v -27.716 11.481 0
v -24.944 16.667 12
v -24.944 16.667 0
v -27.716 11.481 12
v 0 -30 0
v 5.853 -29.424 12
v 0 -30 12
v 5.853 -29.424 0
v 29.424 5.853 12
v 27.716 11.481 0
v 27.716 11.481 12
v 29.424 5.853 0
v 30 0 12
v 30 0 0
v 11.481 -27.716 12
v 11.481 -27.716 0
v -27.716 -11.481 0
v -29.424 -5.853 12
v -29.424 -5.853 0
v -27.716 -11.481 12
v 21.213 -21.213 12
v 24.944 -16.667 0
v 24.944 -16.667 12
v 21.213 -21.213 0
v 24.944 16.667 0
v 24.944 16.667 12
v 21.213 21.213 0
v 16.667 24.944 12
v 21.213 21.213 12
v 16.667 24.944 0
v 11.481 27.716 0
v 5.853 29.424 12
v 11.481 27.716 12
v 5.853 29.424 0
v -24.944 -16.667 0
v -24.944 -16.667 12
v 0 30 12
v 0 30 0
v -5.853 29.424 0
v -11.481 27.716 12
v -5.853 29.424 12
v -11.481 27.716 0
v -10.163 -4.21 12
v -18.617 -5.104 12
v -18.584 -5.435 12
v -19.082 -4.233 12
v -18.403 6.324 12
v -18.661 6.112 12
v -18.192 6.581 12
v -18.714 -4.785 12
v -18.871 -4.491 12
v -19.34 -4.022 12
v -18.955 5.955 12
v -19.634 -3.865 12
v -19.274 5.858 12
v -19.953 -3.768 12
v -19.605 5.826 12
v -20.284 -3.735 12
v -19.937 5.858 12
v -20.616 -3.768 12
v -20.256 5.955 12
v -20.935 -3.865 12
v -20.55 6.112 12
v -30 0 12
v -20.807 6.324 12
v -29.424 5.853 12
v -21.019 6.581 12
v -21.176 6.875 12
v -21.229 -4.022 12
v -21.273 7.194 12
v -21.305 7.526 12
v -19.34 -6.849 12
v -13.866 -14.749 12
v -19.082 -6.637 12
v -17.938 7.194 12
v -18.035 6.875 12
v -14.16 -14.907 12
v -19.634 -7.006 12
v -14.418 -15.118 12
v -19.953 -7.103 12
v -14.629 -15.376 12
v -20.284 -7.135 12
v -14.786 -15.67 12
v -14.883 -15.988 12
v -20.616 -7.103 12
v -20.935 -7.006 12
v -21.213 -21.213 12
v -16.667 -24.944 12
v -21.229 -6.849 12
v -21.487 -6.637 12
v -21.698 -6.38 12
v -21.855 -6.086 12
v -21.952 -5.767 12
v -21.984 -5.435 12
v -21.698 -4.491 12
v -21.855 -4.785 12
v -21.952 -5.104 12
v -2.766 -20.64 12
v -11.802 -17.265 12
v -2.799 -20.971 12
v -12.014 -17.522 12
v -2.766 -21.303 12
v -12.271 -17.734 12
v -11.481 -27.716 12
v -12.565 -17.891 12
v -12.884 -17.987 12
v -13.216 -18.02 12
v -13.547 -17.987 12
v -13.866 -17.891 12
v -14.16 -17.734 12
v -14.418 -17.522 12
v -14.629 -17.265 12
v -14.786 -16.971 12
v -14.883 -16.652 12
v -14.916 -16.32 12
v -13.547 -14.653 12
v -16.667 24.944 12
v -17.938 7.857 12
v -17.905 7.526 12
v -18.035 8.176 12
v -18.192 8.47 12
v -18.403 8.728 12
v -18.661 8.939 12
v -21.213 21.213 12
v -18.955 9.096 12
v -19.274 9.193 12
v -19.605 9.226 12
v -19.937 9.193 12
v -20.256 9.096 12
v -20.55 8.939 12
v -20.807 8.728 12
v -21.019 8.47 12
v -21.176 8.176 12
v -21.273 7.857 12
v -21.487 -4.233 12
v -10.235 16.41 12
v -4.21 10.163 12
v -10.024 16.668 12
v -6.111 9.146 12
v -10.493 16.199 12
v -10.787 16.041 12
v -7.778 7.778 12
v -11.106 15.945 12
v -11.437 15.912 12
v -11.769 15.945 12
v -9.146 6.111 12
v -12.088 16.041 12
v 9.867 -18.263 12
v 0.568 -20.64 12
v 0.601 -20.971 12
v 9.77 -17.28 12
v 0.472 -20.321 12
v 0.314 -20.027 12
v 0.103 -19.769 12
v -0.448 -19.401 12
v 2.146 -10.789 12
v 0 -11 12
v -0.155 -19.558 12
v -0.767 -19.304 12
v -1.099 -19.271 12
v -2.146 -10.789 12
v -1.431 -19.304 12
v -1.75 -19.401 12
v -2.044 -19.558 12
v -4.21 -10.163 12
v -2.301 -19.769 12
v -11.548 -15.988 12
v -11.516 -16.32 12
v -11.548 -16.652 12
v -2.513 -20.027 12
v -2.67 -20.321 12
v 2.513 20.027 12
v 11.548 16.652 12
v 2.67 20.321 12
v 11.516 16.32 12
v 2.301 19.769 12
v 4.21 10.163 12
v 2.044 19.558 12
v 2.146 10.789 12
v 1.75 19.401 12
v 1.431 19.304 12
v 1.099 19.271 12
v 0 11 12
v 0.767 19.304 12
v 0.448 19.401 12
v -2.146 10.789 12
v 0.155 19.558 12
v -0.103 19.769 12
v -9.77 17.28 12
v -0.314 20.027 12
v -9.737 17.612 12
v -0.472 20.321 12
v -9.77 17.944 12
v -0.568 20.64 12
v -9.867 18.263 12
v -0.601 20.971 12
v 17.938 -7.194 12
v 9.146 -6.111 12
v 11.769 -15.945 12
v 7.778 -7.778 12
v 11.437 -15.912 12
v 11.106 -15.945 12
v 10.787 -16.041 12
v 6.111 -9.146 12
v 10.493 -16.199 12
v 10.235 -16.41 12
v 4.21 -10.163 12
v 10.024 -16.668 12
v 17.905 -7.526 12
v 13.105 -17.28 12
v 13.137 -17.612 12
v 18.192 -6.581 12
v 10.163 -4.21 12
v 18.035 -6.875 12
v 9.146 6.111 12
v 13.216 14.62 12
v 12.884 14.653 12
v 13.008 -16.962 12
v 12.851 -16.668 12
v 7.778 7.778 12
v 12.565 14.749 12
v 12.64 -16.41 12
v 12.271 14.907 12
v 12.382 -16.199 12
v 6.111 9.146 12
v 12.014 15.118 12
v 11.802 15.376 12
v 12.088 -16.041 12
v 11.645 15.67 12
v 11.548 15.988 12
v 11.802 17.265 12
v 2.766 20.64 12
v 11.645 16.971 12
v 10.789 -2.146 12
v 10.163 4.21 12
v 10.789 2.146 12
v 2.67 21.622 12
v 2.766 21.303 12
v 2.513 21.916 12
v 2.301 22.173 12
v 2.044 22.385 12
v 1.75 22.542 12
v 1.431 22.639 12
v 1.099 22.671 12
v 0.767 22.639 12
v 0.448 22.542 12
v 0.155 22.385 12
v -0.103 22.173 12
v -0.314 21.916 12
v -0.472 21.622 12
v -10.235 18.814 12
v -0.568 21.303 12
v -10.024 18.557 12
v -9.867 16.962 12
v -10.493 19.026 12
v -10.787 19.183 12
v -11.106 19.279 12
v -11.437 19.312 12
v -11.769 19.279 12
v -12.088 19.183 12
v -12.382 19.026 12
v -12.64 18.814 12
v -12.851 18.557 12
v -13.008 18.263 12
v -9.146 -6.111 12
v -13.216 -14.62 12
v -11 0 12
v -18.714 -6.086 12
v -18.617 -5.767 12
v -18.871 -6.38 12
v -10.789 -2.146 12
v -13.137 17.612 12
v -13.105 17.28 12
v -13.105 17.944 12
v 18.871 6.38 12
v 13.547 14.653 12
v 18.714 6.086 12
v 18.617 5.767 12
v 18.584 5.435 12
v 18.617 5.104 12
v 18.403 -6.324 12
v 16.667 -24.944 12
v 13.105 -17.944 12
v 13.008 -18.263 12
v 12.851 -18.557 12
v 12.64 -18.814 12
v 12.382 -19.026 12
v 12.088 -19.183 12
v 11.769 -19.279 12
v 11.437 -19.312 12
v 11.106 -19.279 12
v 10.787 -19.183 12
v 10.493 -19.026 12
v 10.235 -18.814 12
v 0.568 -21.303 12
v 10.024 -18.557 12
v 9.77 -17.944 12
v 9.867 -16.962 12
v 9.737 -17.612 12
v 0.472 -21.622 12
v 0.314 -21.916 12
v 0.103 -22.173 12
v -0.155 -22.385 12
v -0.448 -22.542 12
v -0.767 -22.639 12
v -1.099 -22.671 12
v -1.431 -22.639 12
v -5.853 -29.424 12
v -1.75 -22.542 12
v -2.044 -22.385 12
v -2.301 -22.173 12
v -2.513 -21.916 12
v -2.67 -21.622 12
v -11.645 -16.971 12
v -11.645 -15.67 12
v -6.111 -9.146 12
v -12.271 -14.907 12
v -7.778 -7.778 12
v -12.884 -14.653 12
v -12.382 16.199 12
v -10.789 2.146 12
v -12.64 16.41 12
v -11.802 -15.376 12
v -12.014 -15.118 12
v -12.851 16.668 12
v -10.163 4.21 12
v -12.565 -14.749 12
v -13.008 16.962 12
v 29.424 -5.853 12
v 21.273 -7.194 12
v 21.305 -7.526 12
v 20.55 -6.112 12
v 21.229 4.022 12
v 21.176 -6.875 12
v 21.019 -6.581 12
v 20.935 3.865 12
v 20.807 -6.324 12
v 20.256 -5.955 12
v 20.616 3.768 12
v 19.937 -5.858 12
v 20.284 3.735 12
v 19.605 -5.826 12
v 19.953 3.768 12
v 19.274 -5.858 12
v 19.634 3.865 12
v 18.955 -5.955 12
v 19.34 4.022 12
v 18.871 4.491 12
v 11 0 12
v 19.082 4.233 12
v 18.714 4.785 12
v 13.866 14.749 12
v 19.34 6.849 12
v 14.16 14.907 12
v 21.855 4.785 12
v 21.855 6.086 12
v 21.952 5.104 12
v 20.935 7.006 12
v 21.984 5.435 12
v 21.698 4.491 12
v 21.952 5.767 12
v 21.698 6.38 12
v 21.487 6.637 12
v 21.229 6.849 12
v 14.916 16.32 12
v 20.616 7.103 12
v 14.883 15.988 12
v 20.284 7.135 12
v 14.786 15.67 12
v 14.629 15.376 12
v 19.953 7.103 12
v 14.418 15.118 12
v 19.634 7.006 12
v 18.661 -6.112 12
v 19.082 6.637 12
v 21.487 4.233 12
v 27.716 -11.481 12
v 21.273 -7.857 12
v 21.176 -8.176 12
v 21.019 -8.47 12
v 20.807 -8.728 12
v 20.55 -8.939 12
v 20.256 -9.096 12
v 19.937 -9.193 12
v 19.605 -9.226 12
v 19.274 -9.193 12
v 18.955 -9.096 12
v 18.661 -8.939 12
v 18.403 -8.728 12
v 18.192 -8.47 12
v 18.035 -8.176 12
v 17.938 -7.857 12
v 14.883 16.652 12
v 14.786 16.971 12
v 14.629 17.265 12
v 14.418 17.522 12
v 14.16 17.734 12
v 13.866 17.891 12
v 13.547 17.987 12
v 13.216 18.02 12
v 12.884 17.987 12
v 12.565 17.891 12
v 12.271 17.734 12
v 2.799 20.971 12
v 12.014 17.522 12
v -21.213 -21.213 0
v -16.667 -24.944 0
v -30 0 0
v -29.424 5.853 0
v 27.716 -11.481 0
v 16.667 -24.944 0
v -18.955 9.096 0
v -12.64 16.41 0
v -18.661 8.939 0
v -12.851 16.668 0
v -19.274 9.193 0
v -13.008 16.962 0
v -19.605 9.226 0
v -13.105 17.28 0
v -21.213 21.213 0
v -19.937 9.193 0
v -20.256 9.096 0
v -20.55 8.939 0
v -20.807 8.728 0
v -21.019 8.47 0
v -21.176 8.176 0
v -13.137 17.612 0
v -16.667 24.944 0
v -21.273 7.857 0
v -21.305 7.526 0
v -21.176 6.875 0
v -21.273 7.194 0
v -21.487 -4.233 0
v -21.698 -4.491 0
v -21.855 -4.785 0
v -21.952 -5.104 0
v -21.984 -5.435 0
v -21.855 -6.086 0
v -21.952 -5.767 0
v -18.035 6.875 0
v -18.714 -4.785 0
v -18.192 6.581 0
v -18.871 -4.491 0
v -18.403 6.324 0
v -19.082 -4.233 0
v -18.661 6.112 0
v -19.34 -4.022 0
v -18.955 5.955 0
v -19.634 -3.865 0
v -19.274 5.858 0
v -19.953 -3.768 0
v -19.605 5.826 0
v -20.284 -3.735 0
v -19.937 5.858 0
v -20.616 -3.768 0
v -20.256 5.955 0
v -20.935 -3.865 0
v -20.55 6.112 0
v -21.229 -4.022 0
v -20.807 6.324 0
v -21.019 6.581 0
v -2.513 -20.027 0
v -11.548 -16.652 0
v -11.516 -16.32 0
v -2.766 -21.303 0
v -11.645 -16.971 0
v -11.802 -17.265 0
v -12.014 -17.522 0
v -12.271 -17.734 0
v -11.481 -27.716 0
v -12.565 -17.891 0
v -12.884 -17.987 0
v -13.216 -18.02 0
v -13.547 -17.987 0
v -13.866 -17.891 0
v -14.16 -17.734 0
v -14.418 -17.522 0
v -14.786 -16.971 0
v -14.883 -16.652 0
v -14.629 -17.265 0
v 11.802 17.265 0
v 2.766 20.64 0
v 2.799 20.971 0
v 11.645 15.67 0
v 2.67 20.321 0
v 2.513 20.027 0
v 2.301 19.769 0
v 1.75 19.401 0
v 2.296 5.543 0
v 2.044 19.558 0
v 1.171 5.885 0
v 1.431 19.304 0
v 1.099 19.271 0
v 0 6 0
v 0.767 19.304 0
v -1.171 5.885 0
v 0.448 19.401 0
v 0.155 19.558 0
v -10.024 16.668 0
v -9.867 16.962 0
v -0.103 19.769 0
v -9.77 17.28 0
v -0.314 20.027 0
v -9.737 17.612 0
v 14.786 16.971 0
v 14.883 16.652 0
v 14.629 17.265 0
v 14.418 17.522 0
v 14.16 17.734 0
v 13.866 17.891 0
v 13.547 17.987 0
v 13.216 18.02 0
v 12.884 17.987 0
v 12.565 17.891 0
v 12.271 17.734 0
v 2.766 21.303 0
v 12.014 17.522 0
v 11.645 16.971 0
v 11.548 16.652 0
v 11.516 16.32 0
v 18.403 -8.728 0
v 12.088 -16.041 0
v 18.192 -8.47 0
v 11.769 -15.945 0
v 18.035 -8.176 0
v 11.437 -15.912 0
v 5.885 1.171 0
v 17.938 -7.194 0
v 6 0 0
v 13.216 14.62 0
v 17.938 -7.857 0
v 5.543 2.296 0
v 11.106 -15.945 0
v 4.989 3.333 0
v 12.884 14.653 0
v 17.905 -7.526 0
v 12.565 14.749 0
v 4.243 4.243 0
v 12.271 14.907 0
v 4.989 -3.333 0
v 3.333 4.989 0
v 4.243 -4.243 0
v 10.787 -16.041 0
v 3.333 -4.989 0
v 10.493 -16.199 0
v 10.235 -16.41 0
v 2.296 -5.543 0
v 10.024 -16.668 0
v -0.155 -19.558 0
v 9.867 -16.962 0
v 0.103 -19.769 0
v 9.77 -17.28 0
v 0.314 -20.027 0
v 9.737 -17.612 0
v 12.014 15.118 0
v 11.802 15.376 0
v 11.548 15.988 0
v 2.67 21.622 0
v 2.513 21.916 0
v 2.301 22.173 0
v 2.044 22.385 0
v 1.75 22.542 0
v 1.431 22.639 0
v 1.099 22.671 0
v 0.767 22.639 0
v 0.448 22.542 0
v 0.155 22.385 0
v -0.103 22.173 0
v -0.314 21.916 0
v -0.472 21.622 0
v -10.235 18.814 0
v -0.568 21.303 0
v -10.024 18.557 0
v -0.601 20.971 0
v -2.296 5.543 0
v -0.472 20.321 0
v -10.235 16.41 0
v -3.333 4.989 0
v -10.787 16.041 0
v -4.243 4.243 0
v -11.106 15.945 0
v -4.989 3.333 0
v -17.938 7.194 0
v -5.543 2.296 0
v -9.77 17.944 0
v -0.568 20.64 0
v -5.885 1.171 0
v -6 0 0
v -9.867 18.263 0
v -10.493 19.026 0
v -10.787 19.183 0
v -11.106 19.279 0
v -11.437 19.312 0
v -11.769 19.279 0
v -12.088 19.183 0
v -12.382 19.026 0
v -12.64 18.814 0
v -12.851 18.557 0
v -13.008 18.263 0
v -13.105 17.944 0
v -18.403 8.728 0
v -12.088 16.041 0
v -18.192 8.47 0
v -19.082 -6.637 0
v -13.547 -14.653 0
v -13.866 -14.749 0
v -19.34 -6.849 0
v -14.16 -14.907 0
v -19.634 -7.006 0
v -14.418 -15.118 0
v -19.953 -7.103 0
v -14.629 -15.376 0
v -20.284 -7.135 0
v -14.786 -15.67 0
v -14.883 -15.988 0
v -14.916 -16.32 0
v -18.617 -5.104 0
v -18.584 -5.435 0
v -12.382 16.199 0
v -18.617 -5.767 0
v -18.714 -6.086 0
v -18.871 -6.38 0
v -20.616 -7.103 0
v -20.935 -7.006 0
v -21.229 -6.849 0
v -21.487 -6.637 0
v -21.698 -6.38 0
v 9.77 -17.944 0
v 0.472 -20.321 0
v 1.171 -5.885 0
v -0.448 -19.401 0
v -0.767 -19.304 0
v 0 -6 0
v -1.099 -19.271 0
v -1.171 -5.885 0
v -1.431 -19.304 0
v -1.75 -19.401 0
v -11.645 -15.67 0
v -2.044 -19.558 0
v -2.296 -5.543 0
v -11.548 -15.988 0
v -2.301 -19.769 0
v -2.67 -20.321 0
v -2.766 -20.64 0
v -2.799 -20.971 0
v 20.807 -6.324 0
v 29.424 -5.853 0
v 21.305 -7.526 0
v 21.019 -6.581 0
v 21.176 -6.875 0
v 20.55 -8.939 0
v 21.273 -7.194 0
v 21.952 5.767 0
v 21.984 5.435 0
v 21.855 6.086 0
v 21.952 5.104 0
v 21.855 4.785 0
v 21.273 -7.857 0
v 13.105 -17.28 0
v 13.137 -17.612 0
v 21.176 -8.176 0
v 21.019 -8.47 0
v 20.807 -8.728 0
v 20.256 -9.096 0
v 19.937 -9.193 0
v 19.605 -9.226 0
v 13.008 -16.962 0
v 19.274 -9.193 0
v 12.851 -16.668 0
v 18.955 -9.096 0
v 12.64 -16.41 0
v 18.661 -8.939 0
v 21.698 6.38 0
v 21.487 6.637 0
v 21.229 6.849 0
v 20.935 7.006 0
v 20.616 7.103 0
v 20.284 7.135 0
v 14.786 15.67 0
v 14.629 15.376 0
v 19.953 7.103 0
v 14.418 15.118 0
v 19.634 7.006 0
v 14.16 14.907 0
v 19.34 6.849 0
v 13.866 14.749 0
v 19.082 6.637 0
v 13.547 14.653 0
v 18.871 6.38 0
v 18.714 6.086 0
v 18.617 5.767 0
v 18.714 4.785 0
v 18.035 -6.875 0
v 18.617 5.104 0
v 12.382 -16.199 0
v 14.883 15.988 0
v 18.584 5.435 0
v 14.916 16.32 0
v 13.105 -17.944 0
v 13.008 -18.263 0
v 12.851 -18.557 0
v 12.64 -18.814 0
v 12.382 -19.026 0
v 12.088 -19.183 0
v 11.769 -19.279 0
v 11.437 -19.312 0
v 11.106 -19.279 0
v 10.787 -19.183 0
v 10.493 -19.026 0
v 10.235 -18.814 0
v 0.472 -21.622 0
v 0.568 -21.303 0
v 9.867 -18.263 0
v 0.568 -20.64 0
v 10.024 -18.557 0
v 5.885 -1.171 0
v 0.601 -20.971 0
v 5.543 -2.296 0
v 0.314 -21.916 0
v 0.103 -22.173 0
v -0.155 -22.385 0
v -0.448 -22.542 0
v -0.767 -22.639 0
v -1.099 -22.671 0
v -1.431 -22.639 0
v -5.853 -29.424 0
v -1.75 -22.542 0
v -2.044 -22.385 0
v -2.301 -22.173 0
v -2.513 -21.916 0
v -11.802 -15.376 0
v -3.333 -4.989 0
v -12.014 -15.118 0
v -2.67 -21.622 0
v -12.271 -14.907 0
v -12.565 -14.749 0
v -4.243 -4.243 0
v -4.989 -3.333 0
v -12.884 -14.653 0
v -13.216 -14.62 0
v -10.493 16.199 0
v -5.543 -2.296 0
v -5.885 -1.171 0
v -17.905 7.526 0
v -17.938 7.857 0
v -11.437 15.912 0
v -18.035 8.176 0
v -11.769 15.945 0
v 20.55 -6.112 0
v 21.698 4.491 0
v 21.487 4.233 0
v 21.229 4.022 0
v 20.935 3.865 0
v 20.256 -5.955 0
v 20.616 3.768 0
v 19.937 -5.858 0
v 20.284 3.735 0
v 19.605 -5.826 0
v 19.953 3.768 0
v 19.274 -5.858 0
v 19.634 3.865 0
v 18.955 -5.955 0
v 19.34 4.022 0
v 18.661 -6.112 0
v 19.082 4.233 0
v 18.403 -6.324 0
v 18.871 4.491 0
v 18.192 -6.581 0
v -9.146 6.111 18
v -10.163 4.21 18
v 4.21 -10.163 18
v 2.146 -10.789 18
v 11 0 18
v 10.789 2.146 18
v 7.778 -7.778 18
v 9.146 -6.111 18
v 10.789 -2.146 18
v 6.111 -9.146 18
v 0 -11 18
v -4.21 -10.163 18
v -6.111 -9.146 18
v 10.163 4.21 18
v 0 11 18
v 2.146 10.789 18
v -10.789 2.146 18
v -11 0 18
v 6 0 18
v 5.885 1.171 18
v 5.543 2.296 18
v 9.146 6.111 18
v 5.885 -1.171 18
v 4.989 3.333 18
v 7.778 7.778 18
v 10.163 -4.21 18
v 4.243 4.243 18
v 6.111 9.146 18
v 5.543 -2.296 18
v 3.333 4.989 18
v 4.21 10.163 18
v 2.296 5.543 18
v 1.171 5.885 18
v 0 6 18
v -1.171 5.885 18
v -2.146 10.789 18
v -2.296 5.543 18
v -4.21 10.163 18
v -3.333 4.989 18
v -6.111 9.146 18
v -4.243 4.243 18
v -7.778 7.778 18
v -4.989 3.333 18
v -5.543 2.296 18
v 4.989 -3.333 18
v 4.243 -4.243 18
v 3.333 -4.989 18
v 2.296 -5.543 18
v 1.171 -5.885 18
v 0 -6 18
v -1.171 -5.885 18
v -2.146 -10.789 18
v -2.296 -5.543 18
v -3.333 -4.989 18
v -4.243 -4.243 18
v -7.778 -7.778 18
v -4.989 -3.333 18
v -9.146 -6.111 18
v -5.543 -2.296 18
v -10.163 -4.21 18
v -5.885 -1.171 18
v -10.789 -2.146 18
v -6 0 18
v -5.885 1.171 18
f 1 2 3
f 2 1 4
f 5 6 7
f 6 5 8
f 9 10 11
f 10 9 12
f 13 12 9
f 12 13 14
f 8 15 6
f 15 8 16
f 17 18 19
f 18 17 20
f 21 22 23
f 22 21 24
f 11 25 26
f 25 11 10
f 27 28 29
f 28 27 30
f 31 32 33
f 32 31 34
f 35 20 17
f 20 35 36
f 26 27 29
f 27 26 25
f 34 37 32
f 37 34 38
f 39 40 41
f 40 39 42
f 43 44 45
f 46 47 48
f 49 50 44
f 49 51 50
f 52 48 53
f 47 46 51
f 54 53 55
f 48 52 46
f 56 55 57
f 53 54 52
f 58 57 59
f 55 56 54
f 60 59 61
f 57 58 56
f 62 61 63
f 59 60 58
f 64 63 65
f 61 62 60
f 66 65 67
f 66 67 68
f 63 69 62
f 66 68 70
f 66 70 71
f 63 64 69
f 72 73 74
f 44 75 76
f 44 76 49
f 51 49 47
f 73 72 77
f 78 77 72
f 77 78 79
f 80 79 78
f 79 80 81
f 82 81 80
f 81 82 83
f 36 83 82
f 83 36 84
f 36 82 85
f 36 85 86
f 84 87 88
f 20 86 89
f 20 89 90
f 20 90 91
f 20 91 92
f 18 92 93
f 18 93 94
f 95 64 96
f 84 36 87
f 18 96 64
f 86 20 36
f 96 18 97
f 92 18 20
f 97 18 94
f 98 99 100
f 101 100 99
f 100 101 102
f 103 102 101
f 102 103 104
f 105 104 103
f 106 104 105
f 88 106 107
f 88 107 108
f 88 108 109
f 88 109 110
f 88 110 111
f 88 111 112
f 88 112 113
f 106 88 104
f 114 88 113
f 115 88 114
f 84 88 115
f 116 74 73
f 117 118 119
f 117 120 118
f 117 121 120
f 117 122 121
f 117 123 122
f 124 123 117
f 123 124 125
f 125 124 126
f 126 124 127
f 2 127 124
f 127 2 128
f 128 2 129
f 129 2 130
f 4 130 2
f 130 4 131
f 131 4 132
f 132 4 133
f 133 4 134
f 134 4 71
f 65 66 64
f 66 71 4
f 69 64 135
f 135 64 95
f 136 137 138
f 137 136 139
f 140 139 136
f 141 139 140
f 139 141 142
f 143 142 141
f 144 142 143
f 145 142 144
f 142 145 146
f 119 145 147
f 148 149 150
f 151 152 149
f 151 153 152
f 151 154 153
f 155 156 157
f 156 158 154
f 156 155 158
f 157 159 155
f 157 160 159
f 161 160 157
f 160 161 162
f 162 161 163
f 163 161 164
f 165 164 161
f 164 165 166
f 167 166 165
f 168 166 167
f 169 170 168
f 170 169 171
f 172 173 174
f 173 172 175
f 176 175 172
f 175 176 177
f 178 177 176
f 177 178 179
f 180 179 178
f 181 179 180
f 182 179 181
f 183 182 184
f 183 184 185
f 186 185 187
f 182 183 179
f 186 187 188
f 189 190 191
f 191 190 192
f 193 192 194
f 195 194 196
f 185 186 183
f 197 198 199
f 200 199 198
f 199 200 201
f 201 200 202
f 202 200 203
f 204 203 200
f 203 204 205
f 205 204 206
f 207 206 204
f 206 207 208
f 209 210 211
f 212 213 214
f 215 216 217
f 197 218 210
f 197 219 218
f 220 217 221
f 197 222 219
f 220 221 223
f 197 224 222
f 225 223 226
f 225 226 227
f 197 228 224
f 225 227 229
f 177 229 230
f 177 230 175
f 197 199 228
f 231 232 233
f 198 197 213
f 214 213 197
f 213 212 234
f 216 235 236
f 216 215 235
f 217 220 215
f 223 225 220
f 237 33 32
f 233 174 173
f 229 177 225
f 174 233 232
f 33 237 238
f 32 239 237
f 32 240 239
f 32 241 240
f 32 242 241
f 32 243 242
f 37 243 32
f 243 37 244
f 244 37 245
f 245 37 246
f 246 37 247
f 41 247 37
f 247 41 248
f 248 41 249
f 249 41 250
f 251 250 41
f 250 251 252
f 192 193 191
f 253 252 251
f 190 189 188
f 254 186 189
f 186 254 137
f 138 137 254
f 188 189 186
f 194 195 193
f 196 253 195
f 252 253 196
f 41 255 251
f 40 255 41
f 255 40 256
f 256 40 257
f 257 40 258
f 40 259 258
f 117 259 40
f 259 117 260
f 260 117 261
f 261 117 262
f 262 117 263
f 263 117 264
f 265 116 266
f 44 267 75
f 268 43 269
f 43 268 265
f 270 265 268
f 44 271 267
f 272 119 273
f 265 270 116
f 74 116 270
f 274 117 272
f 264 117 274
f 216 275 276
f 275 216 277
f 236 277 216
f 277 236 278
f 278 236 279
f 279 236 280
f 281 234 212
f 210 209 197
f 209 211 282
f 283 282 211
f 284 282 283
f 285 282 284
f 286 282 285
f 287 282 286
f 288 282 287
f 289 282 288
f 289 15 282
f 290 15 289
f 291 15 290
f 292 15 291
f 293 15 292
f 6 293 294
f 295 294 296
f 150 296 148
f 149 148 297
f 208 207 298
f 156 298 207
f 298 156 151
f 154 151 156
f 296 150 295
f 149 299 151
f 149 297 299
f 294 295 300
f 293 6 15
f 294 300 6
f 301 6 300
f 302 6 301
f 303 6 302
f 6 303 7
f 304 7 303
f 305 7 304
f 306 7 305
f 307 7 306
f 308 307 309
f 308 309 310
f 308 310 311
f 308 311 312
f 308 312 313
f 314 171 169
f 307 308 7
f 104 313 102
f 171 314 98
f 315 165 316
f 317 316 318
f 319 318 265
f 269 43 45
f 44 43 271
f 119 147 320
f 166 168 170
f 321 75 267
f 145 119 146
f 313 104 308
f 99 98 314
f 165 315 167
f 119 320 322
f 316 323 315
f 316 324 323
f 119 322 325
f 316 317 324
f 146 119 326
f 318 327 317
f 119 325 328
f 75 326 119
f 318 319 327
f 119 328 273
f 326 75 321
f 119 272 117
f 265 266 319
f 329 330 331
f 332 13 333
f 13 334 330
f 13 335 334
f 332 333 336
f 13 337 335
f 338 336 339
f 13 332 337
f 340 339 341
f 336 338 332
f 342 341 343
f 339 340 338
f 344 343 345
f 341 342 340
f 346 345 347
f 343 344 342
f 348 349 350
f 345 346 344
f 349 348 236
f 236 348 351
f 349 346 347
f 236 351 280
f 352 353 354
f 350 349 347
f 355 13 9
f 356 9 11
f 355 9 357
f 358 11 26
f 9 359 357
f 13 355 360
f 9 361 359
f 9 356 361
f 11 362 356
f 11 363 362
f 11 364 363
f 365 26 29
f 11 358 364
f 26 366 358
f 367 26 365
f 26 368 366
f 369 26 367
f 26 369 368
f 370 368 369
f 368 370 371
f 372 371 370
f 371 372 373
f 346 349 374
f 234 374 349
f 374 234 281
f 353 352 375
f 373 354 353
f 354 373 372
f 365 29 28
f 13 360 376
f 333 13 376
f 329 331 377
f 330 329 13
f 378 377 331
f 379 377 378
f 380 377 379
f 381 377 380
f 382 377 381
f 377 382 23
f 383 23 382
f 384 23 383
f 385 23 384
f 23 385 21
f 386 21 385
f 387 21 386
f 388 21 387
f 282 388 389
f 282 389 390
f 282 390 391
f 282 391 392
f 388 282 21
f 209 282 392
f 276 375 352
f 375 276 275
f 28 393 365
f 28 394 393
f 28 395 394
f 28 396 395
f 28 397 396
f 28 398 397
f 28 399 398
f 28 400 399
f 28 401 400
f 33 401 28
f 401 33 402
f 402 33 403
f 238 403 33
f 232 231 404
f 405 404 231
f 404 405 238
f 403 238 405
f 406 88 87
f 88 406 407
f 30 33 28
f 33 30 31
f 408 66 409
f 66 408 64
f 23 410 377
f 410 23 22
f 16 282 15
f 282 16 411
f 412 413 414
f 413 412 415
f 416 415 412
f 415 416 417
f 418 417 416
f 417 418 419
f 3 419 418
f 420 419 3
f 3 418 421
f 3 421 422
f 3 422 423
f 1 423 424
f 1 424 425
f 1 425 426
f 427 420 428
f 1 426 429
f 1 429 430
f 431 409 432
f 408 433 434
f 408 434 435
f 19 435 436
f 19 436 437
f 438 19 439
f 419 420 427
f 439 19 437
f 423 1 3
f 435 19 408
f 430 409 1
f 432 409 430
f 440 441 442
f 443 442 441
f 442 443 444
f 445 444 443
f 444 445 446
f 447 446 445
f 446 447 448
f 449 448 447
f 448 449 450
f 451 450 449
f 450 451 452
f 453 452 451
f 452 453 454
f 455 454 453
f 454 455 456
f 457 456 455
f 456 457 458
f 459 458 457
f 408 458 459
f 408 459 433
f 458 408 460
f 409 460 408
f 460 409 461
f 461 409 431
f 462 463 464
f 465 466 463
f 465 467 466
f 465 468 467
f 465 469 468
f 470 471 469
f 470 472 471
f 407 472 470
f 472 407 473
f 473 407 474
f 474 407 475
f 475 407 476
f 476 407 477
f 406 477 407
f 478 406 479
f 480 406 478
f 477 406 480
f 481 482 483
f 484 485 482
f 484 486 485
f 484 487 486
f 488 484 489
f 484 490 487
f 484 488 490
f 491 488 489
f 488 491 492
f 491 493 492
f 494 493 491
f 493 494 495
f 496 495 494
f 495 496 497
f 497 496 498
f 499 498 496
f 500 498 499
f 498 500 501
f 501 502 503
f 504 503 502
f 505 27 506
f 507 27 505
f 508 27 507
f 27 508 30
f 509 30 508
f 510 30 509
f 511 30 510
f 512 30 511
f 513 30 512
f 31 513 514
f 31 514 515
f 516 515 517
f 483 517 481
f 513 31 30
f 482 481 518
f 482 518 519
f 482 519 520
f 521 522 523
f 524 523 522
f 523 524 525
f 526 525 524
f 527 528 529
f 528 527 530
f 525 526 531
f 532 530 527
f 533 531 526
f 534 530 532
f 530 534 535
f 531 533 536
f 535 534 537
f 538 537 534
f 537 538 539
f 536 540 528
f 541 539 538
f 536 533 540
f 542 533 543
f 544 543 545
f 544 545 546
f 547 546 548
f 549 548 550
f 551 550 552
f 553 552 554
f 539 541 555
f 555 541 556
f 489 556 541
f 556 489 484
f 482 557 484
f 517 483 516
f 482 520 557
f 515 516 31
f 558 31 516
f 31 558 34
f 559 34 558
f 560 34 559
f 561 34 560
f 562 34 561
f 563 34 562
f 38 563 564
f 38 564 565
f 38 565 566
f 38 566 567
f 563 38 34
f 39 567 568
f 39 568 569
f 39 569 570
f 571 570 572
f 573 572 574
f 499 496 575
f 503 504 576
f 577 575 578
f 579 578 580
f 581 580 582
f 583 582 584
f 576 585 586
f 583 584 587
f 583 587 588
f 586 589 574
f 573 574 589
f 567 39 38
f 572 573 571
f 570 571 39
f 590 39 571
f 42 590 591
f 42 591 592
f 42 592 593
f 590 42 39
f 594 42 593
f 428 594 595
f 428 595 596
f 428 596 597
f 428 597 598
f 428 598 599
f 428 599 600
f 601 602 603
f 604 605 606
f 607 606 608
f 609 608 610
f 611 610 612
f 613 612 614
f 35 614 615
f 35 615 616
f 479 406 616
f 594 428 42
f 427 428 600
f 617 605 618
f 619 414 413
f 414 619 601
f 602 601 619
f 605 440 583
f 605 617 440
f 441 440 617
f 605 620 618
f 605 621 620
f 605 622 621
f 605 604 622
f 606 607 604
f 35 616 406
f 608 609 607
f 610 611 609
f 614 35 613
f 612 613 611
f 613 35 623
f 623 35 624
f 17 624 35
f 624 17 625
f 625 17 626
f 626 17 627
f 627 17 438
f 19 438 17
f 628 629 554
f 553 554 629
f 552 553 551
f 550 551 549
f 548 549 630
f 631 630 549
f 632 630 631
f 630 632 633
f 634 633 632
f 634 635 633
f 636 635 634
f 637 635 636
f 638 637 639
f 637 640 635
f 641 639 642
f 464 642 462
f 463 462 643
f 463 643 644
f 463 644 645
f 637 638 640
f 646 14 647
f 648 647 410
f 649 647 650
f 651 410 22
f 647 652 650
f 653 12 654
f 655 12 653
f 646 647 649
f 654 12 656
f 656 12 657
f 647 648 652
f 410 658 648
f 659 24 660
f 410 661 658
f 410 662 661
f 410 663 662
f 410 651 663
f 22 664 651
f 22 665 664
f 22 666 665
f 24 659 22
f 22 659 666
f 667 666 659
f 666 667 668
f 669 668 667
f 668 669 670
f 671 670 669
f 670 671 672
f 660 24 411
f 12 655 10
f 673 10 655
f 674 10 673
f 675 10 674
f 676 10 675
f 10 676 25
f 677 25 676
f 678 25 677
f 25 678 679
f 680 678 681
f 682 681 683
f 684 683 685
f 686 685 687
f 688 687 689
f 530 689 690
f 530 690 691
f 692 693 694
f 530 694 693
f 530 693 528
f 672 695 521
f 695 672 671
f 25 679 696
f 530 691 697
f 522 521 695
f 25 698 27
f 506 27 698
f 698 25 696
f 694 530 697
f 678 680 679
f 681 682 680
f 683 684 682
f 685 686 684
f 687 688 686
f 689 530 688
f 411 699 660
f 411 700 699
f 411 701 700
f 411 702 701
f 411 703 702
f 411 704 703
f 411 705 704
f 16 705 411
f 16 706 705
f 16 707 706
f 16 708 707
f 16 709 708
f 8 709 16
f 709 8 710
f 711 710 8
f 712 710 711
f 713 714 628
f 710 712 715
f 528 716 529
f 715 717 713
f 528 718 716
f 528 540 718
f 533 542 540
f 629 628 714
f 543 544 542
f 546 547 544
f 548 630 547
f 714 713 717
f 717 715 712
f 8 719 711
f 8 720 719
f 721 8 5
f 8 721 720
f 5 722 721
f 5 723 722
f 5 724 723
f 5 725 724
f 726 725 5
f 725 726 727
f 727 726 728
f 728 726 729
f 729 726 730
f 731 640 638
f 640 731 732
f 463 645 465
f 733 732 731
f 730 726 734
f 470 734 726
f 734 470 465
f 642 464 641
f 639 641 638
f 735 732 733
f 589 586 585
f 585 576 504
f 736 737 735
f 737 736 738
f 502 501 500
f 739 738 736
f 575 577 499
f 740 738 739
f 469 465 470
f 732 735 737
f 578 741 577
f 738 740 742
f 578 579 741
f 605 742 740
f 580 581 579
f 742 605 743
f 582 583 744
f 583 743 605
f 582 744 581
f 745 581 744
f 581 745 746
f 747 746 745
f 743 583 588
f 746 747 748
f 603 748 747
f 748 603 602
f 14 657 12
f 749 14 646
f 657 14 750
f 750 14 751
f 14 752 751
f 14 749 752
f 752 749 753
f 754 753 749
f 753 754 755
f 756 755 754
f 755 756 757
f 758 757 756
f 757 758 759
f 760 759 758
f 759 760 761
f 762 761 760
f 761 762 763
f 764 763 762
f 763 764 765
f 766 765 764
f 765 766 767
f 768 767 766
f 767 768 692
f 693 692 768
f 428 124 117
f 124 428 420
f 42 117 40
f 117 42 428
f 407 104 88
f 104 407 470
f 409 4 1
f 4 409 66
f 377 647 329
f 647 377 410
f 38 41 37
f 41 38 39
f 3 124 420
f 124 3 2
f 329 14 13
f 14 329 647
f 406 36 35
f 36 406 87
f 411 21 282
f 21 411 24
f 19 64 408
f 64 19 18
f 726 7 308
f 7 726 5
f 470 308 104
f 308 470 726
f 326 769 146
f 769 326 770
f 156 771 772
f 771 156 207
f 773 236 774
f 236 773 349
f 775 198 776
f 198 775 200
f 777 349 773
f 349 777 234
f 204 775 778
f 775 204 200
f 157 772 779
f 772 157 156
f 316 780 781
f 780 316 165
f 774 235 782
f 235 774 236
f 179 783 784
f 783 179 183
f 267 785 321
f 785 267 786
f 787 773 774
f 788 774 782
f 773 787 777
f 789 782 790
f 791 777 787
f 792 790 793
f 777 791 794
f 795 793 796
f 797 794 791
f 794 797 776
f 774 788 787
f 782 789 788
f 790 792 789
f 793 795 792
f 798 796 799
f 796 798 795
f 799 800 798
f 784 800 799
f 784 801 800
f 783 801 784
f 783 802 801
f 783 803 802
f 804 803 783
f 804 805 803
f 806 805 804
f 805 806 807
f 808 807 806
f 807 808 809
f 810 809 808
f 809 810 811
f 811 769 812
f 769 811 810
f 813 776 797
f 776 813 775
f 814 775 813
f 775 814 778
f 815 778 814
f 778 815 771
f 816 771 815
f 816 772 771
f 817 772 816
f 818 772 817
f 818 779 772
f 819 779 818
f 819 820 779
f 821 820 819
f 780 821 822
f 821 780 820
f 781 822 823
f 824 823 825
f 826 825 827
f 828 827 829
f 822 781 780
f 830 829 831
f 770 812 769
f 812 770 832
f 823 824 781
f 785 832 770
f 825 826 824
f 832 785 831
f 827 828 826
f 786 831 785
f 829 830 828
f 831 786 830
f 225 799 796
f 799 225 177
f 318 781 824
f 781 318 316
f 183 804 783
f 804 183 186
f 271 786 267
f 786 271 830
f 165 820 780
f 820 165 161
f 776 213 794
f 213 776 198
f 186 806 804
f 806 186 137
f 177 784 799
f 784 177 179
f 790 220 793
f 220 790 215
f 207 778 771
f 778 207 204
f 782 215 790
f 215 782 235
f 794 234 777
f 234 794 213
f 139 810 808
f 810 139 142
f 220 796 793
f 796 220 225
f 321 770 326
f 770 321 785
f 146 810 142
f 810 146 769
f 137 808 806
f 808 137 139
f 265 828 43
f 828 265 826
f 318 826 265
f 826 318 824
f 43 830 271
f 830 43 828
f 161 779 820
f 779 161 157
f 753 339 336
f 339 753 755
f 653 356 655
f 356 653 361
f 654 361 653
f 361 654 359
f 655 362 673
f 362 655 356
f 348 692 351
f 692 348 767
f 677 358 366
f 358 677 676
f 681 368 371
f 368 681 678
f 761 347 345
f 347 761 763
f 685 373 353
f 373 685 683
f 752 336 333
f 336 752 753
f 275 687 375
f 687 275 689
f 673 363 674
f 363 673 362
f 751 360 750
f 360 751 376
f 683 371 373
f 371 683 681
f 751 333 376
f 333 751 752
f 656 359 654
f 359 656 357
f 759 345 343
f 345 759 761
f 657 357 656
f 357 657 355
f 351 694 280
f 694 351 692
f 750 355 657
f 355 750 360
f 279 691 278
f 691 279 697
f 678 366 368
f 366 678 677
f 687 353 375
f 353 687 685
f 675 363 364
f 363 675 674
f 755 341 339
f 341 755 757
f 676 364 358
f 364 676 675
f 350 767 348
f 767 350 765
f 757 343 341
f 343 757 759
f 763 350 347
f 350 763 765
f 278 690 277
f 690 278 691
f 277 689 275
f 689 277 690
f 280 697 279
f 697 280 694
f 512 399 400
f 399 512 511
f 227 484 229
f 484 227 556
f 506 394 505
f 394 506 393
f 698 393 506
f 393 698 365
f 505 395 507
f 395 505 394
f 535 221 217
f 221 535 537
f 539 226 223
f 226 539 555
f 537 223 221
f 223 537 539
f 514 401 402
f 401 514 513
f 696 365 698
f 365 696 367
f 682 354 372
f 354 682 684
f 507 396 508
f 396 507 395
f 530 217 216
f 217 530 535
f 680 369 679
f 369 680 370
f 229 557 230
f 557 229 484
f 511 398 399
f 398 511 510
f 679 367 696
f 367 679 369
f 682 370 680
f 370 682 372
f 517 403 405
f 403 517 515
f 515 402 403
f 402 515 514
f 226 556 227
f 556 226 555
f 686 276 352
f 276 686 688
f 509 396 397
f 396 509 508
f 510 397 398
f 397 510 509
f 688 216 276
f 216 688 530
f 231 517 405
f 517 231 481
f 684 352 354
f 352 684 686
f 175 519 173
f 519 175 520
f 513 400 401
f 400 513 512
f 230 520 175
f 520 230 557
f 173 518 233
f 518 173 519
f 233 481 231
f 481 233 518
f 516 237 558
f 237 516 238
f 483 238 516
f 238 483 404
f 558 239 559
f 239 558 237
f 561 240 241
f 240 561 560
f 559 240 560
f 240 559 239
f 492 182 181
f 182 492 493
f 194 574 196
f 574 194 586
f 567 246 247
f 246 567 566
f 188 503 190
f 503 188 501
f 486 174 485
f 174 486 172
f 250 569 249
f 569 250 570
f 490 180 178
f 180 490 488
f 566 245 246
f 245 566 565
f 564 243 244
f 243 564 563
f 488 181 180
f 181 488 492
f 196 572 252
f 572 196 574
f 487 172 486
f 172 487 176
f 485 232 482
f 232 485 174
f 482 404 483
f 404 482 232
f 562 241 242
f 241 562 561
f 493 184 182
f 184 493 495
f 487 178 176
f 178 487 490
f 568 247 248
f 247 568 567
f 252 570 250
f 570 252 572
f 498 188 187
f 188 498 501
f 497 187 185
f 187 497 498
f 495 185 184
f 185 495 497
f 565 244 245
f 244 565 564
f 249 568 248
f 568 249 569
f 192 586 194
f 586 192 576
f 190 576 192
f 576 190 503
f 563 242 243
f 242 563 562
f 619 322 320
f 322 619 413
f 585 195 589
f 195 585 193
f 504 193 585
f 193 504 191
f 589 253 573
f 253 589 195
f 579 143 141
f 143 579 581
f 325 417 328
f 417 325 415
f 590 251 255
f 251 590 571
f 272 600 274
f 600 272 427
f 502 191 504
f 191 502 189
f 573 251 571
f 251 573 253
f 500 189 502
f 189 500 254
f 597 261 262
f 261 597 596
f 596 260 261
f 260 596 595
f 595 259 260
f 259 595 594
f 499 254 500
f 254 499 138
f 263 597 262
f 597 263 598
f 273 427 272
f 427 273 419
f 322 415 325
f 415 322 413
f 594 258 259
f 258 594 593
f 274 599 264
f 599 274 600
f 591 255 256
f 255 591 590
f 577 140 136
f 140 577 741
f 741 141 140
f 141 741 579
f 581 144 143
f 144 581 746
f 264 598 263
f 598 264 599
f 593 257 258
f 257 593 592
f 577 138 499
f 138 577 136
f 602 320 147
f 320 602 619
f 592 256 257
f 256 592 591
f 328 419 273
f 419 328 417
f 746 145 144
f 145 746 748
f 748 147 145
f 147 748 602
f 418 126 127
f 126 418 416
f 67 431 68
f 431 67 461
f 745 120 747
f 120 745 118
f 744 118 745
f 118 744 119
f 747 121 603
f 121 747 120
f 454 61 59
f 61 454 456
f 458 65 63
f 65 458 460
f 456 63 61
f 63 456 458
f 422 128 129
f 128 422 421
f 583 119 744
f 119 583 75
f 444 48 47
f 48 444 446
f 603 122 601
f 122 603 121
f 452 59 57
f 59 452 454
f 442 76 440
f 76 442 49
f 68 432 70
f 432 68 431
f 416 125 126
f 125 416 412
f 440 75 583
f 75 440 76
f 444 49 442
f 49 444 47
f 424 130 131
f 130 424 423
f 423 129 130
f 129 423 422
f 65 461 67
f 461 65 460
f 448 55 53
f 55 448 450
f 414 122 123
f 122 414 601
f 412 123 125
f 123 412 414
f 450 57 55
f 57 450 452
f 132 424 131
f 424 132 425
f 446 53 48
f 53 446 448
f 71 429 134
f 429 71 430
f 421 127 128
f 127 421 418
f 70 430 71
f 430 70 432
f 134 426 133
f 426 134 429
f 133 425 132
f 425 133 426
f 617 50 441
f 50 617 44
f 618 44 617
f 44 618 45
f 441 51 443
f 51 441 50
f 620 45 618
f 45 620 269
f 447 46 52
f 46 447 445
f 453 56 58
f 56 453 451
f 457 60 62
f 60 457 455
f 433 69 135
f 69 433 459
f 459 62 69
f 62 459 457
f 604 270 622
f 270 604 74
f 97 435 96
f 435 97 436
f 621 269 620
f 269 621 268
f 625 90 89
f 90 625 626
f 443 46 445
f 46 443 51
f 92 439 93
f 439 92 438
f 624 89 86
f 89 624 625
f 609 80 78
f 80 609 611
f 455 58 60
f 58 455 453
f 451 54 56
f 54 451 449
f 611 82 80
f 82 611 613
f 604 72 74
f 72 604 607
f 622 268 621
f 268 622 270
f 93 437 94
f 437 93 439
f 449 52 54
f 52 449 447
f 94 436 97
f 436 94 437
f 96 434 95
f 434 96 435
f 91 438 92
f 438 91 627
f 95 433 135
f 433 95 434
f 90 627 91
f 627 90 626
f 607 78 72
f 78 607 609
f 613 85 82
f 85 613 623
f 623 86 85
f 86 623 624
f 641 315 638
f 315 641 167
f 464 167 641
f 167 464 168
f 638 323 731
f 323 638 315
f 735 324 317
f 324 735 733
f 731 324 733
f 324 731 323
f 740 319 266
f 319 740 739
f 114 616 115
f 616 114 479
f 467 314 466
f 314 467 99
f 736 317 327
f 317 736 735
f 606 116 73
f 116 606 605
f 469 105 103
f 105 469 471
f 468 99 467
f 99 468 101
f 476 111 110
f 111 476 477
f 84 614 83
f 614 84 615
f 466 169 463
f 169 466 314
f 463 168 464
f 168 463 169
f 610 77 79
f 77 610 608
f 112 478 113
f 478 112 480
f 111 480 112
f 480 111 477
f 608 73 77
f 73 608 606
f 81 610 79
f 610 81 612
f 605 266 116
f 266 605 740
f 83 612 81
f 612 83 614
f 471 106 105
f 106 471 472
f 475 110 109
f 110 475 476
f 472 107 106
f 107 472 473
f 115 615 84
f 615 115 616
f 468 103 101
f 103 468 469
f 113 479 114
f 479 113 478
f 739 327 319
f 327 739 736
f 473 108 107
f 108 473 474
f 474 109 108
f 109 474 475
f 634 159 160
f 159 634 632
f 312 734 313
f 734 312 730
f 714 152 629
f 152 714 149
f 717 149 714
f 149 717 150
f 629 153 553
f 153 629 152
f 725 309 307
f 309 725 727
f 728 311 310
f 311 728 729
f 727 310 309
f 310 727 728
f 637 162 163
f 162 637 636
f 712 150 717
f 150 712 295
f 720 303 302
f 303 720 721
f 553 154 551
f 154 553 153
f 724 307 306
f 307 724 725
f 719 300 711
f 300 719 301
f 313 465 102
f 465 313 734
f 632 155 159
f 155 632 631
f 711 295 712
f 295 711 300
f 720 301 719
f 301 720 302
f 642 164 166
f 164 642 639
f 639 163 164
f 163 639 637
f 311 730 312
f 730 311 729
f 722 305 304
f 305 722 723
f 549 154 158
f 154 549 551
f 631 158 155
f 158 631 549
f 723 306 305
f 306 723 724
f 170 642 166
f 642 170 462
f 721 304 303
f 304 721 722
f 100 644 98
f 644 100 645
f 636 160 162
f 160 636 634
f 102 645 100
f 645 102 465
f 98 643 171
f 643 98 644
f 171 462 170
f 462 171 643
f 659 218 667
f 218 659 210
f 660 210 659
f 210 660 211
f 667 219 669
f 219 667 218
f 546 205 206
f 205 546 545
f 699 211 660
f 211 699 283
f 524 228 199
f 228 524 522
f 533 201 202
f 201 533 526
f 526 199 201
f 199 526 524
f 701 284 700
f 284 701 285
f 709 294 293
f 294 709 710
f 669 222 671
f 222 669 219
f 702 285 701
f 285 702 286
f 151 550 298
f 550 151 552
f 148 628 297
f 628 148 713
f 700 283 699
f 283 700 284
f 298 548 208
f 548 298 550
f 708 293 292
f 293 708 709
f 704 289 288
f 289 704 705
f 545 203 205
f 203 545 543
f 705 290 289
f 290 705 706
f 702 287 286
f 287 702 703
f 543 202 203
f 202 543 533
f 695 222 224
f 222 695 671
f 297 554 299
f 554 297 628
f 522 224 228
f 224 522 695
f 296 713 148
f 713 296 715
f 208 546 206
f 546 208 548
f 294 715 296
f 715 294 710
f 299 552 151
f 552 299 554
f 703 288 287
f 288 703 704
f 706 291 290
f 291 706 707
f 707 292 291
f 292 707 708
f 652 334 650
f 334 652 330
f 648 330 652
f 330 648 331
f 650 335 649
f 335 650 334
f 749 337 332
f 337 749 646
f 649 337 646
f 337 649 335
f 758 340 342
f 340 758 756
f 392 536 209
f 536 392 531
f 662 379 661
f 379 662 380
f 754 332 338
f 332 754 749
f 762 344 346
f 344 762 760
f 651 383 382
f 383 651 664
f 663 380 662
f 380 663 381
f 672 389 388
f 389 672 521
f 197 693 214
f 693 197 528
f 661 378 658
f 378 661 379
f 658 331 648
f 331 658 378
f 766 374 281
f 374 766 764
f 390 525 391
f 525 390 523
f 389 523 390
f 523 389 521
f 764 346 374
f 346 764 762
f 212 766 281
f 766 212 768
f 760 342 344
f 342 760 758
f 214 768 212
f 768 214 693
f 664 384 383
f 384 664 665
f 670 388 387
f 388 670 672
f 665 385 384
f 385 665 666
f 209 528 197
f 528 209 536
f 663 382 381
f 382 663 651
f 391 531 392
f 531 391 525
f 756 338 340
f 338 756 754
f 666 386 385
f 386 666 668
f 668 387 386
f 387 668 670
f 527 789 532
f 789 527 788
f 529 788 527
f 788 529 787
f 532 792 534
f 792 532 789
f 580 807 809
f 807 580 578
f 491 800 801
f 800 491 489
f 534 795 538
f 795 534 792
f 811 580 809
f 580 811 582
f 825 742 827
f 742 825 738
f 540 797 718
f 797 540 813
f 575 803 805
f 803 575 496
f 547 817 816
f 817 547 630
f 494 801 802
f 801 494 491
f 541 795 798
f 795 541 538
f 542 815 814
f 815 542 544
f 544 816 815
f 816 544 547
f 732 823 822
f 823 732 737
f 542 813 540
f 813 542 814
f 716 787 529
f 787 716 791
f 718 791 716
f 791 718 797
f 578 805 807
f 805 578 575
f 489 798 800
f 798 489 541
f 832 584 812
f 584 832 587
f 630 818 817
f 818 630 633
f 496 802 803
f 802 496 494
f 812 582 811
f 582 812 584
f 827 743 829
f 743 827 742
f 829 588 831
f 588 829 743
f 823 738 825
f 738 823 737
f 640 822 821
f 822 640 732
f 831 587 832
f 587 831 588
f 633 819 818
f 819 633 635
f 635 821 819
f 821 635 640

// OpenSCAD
$fn = 32;

// ----------------------------------------------------------------------
// Flange Ø60 x 12
// 10 holes on a Ø42 bolt circle, bolted joints
// ----------------------------------------------------------------------

// --- parameters (mm) ---
flange_d = 60;   // outside diameter of the flange
thickness = 12;  // flange thickness
holes = 10;      // number of bolt holes
pcd = 42;        // bolt circle diameter
start_deg = 15;  // angle of the first hole, from +X
hole_d = 3.4;    // bolt hole diameter
bore_d = 12;     // central through bore
hub_d = 22;      // hub outside diameter
hub_h = 6;       // hub height above the flange face (0 = no hub)

// --- derived feature positions (mm) ---
height = thickness + hub_h;  // = 18   overall height of the part
pcd_r = pcd / 2;             // = 21   bolt circle radius
hole_step = 360 / holes;     // = 36   angular pitch
feature_centers = [
  [pcd_r * cos(start_deg + 0 * hole_step), pcd_r * sin(start_deg + 0 * hole_step)],
  [pcd_r * cos(start_deg + 1 * hole_step), pcd_r * sin(start_deg + 1 * hole_step)],
  [pcd_r * cos(start_deg + 2 * hole_step), pcd_r * sin(start_deg + 2 * hole_step)],
  [pcd_r * cos(start_deg + 3 * hole_step), pcd_r * sin(start_deg + 3 * hole_step)],
  [pcd_r * cos(start_deg + 4 * hole_step), pcd_r * sin(start_deg + 4 * hole_step)],
  [pcd_r * cos(start_deg + 5 * hole_step), pcd_r * sin(start_deg + 5 * hole_step)],
  [pcd_r * cos(start_deg + 6 * hole_step), pcd_r * sin(start_deg + 6 * hole_step)],
  [pcd_r * cos(start_deg + 7 * hole_step), pcd_r * sin(start_deg + 7 * hole_step)],
  [pcd_r * cos(start_deg + 8 * hole_step), pcd_r * sin(start_deg + 8 * hole_step)],
  [pcd_r * cos(start_deg + 9 * hole_step), pcd_r * sin(start_deg + 9 * hole_step)]
];   // bolt hole centres on the pitch circle

// flange disc, every hole and the bore cut straight through
difference() {
  union() {
    cylinder(d = flange_d, h = thickness);
    cylinder(d = hub_d, h = height);  // hub, overlapped into the flange
  }
  translate([0, 0, -1]) cylinder(d = bore_d, h = height + 2);  // bore, through
  for (centre = feature_centers)
    translate([centre[0], centre[1], -1]) cylinder(d = hole_d, h = thickness + 2);
}
